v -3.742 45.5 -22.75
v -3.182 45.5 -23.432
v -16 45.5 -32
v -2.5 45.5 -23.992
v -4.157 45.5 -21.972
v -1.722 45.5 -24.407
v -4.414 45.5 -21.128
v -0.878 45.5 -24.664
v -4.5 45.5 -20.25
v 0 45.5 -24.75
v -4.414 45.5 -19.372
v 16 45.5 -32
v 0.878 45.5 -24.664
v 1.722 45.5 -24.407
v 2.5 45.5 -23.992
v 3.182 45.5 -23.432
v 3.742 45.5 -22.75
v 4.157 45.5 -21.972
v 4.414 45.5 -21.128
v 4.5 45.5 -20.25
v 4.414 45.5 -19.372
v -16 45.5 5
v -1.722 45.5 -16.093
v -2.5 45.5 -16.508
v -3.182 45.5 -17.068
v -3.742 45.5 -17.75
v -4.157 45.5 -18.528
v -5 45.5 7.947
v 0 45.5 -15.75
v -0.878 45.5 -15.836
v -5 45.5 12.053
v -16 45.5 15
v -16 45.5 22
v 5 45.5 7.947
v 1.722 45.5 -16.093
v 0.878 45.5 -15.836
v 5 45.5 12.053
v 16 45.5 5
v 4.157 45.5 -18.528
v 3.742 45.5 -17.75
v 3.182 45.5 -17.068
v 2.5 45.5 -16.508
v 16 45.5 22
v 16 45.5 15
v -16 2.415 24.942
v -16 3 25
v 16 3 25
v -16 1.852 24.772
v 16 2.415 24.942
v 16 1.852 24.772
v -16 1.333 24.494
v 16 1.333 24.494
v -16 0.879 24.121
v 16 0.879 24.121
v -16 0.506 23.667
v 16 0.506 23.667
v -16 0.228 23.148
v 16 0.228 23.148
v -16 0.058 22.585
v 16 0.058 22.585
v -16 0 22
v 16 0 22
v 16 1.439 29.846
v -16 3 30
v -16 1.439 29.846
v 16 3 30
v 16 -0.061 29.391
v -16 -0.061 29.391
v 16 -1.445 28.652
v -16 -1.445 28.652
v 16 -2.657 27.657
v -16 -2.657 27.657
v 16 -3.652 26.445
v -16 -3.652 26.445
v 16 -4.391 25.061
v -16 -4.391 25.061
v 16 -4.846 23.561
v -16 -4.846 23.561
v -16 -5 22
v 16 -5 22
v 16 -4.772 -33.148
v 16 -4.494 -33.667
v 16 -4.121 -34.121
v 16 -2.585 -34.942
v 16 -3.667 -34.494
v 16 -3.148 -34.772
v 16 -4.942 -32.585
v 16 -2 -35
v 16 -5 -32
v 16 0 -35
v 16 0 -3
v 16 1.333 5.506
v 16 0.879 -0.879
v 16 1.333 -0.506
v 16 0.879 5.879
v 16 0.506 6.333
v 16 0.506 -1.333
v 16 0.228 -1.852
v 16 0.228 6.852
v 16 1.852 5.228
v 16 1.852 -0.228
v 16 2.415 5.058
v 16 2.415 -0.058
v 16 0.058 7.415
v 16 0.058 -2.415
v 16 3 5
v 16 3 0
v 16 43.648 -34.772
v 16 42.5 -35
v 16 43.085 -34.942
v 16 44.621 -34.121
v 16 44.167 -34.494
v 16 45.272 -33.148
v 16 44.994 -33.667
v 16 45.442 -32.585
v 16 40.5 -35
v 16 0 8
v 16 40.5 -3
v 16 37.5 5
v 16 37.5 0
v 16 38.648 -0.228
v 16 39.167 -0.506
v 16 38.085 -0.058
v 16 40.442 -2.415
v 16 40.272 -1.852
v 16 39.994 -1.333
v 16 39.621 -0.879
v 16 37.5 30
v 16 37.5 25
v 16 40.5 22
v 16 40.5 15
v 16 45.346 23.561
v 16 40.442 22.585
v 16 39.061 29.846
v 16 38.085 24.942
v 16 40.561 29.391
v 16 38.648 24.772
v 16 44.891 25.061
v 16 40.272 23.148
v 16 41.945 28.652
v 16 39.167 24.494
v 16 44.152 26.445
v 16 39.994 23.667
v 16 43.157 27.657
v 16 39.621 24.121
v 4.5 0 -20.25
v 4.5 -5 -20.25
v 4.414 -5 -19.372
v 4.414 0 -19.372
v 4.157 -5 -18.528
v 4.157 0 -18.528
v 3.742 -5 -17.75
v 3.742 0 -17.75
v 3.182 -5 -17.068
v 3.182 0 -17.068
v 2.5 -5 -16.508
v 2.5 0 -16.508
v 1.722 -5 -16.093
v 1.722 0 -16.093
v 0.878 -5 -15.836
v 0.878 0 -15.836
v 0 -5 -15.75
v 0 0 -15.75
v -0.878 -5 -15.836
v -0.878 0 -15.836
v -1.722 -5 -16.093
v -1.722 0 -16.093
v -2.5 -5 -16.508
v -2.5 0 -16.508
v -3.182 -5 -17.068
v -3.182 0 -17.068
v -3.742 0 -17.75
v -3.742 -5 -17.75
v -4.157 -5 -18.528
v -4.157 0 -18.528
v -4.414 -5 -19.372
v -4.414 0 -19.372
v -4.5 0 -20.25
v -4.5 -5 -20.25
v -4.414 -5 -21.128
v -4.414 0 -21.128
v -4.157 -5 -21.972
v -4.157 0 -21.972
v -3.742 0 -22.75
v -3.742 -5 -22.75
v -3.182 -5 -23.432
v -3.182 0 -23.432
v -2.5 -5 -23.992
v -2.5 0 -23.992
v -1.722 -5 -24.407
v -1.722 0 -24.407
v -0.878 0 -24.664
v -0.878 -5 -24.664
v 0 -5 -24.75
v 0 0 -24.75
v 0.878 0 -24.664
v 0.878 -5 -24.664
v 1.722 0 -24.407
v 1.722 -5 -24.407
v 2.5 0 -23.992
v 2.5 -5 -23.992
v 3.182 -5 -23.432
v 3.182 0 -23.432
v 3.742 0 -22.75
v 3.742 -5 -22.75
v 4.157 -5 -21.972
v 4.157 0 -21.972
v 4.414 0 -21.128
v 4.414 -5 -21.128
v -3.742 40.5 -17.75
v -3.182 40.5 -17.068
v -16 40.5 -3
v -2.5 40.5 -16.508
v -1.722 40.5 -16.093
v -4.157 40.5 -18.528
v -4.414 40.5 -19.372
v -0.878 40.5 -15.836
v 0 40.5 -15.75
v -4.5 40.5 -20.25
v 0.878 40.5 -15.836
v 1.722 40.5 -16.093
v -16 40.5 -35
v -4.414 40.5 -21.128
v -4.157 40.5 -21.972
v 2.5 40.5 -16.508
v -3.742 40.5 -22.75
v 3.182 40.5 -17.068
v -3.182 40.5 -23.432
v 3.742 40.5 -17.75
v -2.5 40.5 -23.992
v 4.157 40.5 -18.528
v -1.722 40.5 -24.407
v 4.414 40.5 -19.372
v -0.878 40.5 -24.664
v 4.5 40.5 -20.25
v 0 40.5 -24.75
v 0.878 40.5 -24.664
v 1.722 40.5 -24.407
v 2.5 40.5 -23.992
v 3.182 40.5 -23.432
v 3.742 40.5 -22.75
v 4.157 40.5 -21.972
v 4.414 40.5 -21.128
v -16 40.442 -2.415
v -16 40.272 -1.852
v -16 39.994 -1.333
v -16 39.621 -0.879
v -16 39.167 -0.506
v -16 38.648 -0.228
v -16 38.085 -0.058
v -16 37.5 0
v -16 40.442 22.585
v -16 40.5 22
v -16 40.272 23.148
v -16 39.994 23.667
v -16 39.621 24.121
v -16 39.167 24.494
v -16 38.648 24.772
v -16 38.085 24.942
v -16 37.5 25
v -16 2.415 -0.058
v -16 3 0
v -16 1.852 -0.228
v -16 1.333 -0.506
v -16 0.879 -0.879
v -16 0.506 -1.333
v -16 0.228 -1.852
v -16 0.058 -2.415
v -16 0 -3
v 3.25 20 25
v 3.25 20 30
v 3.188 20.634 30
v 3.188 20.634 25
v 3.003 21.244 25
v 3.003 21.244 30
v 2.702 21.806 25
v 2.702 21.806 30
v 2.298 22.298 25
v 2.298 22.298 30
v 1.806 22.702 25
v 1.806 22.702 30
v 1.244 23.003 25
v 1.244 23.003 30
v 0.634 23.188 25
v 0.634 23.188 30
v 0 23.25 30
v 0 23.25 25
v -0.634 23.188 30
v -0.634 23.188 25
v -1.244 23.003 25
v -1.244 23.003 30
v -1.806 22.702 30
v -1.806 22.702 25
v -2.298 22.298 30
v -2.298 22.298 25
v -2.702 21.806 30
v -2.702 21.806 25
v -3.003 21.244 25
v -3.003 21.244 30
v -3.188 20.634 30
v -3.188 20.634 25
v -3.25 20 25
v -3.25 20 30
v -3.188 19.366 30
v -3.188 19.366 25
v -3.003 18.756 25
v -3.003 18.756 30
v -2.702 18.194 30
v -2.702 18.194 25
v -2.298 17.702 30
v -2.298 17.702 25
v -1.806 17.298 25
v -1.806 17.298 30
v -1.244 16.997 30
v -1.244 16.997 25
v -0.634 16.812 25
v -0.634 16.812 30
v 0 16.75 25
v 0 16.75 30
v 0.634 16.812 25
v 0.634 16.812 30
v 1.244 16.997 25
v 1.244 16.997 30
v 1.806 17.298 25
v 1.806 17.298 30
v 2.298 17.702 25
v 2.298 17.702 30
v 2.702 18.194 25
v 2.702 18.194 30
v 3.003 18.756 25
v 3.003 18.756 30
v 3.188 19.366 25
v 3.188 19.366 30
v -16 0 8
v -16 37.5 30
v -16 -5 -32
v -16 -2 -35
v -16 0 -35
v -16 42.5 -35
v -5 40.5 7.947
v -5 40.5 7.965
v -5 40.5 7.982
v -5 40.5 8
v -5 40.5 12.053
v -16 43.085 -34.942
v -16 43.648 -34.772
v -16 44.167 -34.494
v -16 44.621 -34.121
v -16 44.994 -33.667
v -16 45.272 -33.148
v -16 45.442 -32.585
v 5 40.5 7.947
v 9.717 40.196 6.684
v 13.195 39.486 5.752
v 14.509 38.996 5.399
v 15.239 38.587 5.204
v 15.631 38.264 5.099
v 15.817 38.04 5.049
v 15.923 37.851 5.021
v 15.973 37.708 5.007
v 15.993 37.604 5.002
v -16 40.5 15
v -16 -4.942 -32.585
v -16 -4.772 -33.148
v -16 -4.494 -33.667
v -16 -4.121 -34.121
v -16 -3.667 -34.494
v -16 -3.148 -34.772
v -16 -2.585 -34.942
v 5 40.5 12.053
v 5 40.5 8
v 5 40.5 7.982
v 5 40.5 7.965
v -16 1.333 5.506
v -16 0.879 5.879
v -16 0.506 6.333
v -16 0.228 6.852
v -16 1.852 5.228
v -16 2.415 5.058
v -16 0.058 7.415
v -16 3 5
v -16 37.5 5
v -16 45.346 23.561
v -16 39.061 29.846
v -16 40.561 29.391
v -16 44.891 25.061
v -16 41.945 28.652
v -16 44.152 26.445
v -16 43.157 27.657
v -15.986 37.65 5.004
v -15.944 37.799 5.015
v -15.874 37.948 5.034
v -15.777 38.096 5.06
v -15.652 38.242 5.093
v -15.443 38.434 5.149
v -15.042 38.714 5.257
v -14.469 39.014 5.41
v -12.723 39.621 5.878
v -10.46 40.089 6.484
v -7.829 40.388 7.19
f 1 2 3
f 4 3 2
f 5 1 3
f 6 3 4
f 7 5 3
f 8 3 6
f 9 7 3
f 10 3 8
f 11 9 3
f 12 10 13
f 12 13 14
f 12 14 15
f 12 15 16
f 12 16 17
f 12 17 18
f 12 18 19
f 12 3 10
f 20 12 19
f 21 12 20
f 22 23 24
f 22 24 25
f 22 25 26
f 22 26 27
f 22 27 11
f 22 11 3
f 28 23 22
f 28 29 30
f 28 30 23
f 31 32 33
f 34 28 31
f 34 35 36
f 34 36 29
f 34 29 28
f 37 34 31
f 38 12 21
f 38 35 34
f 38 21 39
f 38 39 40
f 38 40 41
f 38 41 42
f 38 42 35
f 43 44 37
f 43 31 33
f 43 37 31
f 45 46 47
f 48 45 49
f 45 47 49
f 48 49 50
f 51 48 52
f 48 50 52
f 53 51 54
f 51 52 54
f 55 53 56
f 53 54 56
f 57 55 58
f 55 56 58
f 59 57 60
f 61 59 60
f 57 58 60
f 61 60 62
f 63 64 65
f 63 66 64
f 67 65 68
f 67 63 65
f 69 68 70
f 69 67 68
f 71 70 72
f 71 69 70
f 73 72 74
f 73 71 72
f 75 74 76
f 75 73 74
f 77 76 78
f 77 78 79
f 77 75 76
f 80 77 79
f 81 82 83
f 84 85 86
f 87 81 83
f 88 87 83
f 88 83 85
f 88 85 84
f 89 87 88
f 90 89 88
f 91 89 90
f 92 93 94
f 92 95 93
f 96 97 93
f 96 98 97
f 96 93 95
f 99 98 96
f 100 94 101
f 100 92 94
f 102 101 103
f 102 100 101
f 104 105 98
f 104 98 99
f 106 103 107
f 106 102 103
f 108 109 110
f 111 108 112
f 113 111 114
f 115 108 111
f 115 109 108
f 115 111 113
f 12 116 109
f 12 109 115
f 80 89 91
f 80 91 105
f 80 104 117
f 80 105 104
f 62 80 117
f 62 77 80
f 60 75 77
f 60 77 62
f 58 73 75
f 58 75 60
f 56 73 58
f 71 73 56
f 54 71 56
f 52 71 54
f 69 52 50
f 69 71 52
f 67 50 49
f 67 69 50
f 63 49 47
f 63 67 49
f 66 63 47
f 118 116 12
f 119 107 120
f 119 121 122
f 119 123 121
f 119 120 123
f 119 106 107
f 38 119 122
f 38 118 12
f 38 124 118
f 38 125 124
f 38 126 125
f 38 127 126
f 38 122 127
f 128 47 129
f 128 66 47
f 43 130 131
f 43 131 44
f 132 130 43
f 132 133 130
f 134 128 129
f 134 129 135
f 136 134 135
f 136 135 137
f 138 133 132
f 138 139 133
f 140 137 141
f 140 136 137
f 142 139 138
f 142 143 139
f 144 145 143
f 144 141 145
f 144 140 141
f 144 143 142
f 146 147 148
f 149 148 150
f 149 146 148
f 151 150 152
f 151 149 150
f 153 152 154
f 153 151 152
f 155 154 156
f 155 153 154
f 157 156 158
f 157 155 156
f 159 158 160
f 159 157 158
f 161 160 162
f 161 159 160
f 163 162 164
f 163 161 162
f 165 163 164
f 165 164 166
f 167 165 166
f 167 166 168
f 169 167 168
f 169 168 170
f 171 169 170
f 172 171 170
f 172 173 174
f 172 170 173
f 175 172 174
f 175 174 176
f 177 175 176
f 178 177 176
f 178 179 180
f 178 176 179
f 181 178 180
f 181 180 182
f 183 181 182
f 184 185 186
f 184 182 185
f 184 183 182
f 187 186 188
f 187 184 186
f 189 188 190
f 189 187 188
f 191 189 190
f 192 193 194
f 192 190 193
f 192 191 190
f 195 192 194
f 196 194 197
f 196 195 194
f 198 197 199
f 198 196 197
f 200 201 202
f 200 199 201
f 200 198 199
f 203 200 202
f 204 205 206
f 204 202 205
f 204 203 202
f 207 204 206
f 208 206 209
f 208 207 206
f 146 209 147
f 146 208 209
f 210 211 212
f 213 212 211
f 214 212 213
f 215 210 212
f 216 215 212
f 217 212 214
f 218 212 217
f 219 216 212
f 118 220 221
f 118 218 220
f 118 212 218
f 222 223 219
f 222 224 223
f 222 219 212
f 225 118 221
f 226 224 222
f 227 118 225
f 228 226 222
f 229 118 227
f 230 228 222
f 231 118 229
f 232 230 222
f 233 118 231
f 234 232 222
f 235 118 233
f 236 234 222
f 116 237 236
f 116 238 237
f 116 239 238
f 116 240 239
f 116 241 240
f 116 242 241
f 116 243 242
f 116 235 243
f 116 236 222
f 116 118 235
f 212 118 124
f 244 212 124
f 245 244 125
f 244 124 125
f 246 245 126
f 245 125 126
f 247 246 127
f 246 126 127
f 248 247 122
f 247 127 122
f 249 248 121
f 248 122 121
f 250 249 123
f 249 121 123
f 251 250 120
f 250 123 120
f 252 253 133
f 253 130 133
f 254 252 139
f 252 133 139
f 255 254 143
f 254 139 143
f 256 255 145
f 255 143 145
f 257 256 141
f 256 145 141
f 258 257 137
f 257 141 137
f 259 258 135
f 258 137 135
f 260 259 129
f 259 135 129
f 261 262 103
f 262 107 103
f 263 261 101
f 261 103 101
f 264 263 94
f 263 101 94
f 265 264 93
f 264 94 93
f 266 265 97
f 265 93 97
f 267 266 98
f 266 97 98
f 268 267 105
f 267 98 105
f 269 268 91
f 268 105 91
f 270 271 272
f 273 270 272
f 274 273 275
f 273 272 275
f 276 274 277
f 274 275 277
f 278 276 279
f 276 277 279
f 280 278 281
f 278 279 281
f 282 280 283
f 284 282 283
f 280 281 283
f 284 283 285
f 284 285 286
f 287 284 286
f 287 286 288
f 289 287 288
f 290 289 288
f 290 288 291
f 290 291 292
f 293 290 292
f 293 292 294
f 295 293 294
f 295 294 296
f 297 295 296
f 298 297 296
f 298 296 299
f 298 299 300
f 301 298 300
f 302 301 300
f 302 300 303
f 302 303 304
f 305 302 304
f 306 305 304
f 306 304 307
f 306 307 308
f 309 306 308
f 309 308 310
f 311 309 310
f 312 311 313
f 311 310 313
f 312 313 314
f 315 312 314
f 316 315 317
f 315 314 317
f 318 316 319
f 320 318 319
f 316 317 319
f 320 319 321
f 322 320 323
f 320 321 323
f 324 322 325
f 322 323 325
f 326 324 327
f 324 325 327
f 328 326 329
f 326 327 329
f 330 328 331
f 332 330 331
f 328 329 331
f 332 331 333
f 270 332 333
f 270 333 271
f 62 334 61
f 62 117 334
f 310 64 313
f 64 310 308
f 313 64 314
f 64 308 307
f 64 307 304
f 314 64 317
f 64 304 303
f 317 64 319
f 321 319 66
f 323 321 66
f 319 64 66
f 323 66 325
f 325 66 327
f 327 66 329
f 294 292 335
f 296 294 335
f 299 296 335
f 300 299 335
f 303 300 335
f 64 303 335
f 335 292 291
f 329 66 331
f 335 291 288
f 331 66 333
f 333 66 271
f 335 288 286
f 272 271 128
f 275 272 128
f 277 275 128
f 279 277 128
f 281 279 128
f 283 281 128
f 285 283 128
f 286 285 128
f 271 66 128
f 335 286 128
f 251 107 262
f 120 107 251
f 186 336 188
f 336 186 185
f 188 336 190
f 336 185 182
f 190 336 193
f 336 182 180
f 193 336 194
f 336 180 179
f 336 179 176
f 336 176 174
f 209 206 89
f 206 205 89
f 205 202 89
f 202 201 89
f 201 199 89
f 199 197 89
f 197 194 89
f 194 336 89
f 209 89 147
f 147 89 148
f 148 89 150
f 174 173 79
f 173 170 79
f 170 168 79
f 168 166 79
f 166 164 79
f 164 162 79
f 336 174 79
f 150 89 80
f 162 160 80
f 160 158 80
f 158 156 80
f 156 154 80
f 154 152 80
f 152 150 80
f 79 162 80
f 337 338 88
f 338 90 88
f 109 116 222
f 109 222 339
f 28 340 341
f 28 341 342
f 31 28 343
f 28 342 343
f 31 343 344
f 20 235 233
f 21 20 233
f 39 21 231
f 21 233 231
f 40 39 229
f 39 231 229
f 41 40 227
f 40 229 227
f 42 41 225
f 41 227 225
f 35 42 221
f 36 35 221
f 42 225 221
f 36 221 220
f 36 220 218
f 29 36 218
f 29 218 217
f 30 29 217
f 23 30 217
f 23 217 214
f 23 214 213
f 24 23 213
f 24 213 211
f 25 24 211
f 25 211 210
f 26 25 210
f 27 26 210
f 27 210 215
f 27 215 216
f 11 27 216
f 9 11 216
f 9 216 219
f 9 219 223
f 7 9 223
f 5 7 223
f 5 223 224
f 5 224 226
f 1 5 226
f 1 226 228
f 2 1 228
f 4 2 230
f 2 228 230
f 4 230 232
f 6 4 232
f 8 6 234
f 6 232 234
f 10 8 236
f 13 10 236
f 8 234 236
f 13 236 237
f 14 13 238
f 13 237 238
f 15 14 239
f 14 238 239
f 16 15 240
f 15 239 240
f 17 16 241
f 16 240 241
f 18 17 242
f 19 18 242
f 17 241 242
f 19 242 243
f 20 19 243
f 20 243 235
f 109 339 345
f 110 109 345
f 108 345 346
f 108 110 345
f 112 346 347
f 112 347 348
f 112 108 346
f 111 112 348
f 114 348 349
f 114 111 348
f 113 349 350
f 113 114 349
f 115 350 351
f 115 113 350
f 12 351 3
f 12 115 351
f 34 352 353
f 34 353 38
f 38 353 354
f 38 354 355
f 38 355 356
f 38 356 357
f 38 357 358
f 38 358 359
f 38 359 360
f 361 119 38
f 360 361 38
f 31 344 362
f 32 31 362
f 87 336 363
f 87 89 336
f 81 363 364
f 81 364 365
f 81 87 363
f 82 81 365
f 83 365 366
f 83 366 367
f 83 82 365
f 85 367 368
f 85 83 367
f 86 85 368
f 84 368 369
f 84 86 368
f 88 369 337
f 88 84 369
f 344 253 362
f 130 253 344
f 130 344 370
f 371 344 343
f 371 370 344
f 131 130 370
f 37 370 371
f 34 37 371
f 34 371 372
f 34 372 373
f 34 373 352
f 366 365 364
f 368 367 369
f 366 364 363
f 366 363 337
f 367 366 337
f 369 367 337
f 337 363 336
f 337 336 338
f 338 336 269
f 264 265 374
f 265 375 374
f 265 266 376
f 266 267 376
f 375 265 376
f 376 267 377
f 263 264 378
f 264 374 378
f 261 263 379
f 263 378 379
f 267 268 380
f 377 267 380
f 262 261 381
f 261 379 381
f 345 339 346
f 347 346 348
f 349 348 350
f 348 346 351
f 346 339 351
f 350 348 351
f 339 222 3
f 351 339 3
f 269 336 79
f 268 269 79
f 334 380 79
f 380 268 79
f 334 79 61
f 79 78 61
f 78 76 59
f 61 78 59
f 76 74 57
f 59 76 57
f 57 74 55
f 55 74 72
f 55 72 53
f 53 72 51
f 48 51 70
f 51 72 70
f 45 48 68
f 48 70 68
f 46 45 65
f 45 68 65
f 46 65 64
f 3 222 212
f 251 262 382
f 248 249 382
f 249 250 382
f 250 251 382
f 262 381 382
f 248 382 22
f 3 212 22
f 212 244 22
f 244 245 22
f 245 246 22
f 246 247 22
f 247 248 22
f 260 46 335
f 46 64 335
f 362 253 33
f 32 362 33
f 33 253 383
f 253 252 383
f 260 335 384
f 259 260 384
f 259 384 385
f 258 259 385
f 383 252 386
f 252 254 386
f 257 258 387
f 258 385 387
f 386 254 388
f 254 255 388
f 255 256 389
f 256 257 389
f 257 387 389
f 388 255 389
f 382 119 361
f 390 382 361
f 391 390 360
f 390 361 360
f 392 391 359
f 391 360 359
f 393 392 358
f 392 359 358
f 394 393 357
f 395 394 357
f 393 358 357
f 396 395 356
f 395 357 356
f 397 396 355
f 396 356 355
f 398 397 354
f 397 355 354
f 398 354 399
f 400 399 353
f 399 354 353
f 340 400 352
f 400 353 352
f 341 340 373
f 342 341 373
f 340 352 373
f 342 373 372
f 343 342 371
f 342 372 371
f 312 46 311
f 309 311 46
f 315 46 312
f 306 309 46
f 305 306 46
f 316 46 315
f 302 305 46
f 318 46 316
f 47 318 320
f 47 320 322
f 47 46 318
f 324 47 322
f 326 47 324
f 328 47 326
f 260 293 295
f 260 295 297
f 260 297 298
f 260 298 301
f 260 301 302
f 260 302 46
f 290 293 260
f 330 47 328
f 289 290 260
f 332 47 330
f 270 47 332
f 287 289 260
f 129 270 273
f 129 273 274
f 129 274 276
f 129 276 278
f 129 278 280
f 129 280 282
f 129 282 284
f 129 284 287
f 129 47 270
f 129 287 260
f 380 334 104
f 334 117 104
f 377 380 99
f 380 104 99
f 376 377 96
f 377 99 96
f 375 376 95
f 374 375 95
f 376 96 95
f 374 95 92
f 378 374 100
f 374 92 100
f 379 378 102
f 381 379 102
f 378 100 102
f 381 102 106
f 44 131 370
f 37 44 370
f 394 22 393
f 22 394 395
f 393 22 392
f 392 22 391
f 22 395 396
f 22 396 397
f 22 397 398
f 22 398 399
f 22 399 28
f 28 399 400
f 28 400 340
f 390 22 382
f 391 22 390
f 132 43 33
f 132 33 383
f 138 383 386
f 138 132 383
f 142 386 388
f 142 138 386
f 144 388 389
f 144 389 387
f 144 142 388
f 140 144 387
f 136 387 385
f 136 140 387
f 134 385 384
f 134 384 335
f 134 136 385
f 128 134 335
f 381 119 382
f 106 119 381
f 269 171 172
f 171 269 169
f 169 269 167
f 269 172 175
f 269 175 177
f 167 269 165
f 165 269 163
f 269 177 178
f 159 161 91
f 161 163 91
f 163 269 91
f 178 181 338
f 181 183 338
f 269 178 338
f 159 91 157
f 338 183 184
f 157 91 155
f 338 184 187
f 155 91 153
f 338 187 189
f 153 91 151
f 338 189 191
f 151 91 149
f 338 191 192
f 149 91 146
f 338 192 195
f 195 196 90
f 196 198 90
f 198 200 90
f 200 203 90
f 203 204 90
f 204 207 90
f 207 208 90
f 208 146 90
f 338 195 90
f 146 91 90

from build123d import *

# Parameters (mm, degrees)
PAD_DEPTH            = 16
SKETCH014_R          = 3.25
POCKET007_DEPTH      = 40
SKETCH015_R          = 4.5
POCKET008_DEPTH      = 45.501
POCKET008_DEPTH_BACK = -5.001
POCKET009_DEPTH      = 25.251


with BuildPart() as part:
    # Sketch → Pad (new body, symmetric)
    with BuildSketch(Plane.YZ):
        with BuildLine():
            Line((3, 0), (37.5, 0))
            ThreePointArc((40.5, -3), (39.62132, -0.87868), (37.5, 0))
            Line((40.5, -3), (40.5, -35))
            Line((40.5, -35), (42.5, -35))
            ThreePointArc((42.5, -35), (44.62132, -34.12132), (45.5, -32))
            Line((45.5, -32), (45.5, 22))
            ThreePointArc((45.5, 22), (43.156854, 27.656854), (37.5, 30))
            Line((3, 30), (37.5, 30))
            ThreePointArc((3, 30), (-2.656854, 27.656854), (-5, 22))
            Line((-5, -32), (-5, 22))
            ThreePointArc((-5, -32), (-4.12132, -34.12132), (-2, -35))
            Line((0, -35), (-2, -35))
            Line((0, -3), (0, -35))
            ThreePointArc((3, 0), (0.87868, -0.87868), (0, -3))
        make_face()
        with BuildLine():
            ThreePointArc((3, 25), (0.87868, 24.12132), (0, 22))
            Line((0, 8), (0, 22))
            ThreePointArc((0, 8), (0.87868, 5.87868), (3, 5))
            Line((37.5, 5), (3, 5))
            ThreePointArc((37.5, 5), (39.62132, 5.87868), (40.5, 8))
            Line((40.5, 22), (40.5, 8))
            ThreePointArc((40.5, 22), (39.62132, 24.12132), (37.5, 25))
            Line((3, 25), (37.5, 25))
        make_face(mode=Mode.SUBTRACT)
    extrude(amount=PAD_DEPTH, both=True)

    # Sketch014 → Pocket007 (cut)
    with BuildSketch(Plane.XY.offset(50)):
        with Locations((0, 20)):
            Circle(SKETCH014_R)
    extrude(amount=-POCKET007_DEPTH, mode=Mode.SUBTRACT)

    # Sketch015 → Pocket008 (cut, two sides)
    with BuildSketch(Plane.XZ) as pocket008_sk:
        with Locations((0, -20.25)):
            Circle(SKETCH015_R)
    extrude(amount=-POCKET008_DEPTH, mode=Mode.SUBTRACT)
    extrude(pocket008_sk.sketch, amount=-POCKET008_DEPTH_BACK, mode=Mode.SUBTRACT)

    # Sketch016 → Pocket009 (cut, through all)
    with BuildSketch(Plane.XZ.offset(-20.25)):
        Polygon((-56, 5), (-16, 5), (-5, 7.947441), (-5, 12.052559), (-16, 15), (-56, 15), align=None)
        Polygon((5, 12.052559), (5, 7.947441), (16, 5), (56, 5), (56, 15), (16, 15), align=None)
    extrude(amount=-POCKET009_DEPTH, mode=Mode.SUBTRACT)


solid = part.part
